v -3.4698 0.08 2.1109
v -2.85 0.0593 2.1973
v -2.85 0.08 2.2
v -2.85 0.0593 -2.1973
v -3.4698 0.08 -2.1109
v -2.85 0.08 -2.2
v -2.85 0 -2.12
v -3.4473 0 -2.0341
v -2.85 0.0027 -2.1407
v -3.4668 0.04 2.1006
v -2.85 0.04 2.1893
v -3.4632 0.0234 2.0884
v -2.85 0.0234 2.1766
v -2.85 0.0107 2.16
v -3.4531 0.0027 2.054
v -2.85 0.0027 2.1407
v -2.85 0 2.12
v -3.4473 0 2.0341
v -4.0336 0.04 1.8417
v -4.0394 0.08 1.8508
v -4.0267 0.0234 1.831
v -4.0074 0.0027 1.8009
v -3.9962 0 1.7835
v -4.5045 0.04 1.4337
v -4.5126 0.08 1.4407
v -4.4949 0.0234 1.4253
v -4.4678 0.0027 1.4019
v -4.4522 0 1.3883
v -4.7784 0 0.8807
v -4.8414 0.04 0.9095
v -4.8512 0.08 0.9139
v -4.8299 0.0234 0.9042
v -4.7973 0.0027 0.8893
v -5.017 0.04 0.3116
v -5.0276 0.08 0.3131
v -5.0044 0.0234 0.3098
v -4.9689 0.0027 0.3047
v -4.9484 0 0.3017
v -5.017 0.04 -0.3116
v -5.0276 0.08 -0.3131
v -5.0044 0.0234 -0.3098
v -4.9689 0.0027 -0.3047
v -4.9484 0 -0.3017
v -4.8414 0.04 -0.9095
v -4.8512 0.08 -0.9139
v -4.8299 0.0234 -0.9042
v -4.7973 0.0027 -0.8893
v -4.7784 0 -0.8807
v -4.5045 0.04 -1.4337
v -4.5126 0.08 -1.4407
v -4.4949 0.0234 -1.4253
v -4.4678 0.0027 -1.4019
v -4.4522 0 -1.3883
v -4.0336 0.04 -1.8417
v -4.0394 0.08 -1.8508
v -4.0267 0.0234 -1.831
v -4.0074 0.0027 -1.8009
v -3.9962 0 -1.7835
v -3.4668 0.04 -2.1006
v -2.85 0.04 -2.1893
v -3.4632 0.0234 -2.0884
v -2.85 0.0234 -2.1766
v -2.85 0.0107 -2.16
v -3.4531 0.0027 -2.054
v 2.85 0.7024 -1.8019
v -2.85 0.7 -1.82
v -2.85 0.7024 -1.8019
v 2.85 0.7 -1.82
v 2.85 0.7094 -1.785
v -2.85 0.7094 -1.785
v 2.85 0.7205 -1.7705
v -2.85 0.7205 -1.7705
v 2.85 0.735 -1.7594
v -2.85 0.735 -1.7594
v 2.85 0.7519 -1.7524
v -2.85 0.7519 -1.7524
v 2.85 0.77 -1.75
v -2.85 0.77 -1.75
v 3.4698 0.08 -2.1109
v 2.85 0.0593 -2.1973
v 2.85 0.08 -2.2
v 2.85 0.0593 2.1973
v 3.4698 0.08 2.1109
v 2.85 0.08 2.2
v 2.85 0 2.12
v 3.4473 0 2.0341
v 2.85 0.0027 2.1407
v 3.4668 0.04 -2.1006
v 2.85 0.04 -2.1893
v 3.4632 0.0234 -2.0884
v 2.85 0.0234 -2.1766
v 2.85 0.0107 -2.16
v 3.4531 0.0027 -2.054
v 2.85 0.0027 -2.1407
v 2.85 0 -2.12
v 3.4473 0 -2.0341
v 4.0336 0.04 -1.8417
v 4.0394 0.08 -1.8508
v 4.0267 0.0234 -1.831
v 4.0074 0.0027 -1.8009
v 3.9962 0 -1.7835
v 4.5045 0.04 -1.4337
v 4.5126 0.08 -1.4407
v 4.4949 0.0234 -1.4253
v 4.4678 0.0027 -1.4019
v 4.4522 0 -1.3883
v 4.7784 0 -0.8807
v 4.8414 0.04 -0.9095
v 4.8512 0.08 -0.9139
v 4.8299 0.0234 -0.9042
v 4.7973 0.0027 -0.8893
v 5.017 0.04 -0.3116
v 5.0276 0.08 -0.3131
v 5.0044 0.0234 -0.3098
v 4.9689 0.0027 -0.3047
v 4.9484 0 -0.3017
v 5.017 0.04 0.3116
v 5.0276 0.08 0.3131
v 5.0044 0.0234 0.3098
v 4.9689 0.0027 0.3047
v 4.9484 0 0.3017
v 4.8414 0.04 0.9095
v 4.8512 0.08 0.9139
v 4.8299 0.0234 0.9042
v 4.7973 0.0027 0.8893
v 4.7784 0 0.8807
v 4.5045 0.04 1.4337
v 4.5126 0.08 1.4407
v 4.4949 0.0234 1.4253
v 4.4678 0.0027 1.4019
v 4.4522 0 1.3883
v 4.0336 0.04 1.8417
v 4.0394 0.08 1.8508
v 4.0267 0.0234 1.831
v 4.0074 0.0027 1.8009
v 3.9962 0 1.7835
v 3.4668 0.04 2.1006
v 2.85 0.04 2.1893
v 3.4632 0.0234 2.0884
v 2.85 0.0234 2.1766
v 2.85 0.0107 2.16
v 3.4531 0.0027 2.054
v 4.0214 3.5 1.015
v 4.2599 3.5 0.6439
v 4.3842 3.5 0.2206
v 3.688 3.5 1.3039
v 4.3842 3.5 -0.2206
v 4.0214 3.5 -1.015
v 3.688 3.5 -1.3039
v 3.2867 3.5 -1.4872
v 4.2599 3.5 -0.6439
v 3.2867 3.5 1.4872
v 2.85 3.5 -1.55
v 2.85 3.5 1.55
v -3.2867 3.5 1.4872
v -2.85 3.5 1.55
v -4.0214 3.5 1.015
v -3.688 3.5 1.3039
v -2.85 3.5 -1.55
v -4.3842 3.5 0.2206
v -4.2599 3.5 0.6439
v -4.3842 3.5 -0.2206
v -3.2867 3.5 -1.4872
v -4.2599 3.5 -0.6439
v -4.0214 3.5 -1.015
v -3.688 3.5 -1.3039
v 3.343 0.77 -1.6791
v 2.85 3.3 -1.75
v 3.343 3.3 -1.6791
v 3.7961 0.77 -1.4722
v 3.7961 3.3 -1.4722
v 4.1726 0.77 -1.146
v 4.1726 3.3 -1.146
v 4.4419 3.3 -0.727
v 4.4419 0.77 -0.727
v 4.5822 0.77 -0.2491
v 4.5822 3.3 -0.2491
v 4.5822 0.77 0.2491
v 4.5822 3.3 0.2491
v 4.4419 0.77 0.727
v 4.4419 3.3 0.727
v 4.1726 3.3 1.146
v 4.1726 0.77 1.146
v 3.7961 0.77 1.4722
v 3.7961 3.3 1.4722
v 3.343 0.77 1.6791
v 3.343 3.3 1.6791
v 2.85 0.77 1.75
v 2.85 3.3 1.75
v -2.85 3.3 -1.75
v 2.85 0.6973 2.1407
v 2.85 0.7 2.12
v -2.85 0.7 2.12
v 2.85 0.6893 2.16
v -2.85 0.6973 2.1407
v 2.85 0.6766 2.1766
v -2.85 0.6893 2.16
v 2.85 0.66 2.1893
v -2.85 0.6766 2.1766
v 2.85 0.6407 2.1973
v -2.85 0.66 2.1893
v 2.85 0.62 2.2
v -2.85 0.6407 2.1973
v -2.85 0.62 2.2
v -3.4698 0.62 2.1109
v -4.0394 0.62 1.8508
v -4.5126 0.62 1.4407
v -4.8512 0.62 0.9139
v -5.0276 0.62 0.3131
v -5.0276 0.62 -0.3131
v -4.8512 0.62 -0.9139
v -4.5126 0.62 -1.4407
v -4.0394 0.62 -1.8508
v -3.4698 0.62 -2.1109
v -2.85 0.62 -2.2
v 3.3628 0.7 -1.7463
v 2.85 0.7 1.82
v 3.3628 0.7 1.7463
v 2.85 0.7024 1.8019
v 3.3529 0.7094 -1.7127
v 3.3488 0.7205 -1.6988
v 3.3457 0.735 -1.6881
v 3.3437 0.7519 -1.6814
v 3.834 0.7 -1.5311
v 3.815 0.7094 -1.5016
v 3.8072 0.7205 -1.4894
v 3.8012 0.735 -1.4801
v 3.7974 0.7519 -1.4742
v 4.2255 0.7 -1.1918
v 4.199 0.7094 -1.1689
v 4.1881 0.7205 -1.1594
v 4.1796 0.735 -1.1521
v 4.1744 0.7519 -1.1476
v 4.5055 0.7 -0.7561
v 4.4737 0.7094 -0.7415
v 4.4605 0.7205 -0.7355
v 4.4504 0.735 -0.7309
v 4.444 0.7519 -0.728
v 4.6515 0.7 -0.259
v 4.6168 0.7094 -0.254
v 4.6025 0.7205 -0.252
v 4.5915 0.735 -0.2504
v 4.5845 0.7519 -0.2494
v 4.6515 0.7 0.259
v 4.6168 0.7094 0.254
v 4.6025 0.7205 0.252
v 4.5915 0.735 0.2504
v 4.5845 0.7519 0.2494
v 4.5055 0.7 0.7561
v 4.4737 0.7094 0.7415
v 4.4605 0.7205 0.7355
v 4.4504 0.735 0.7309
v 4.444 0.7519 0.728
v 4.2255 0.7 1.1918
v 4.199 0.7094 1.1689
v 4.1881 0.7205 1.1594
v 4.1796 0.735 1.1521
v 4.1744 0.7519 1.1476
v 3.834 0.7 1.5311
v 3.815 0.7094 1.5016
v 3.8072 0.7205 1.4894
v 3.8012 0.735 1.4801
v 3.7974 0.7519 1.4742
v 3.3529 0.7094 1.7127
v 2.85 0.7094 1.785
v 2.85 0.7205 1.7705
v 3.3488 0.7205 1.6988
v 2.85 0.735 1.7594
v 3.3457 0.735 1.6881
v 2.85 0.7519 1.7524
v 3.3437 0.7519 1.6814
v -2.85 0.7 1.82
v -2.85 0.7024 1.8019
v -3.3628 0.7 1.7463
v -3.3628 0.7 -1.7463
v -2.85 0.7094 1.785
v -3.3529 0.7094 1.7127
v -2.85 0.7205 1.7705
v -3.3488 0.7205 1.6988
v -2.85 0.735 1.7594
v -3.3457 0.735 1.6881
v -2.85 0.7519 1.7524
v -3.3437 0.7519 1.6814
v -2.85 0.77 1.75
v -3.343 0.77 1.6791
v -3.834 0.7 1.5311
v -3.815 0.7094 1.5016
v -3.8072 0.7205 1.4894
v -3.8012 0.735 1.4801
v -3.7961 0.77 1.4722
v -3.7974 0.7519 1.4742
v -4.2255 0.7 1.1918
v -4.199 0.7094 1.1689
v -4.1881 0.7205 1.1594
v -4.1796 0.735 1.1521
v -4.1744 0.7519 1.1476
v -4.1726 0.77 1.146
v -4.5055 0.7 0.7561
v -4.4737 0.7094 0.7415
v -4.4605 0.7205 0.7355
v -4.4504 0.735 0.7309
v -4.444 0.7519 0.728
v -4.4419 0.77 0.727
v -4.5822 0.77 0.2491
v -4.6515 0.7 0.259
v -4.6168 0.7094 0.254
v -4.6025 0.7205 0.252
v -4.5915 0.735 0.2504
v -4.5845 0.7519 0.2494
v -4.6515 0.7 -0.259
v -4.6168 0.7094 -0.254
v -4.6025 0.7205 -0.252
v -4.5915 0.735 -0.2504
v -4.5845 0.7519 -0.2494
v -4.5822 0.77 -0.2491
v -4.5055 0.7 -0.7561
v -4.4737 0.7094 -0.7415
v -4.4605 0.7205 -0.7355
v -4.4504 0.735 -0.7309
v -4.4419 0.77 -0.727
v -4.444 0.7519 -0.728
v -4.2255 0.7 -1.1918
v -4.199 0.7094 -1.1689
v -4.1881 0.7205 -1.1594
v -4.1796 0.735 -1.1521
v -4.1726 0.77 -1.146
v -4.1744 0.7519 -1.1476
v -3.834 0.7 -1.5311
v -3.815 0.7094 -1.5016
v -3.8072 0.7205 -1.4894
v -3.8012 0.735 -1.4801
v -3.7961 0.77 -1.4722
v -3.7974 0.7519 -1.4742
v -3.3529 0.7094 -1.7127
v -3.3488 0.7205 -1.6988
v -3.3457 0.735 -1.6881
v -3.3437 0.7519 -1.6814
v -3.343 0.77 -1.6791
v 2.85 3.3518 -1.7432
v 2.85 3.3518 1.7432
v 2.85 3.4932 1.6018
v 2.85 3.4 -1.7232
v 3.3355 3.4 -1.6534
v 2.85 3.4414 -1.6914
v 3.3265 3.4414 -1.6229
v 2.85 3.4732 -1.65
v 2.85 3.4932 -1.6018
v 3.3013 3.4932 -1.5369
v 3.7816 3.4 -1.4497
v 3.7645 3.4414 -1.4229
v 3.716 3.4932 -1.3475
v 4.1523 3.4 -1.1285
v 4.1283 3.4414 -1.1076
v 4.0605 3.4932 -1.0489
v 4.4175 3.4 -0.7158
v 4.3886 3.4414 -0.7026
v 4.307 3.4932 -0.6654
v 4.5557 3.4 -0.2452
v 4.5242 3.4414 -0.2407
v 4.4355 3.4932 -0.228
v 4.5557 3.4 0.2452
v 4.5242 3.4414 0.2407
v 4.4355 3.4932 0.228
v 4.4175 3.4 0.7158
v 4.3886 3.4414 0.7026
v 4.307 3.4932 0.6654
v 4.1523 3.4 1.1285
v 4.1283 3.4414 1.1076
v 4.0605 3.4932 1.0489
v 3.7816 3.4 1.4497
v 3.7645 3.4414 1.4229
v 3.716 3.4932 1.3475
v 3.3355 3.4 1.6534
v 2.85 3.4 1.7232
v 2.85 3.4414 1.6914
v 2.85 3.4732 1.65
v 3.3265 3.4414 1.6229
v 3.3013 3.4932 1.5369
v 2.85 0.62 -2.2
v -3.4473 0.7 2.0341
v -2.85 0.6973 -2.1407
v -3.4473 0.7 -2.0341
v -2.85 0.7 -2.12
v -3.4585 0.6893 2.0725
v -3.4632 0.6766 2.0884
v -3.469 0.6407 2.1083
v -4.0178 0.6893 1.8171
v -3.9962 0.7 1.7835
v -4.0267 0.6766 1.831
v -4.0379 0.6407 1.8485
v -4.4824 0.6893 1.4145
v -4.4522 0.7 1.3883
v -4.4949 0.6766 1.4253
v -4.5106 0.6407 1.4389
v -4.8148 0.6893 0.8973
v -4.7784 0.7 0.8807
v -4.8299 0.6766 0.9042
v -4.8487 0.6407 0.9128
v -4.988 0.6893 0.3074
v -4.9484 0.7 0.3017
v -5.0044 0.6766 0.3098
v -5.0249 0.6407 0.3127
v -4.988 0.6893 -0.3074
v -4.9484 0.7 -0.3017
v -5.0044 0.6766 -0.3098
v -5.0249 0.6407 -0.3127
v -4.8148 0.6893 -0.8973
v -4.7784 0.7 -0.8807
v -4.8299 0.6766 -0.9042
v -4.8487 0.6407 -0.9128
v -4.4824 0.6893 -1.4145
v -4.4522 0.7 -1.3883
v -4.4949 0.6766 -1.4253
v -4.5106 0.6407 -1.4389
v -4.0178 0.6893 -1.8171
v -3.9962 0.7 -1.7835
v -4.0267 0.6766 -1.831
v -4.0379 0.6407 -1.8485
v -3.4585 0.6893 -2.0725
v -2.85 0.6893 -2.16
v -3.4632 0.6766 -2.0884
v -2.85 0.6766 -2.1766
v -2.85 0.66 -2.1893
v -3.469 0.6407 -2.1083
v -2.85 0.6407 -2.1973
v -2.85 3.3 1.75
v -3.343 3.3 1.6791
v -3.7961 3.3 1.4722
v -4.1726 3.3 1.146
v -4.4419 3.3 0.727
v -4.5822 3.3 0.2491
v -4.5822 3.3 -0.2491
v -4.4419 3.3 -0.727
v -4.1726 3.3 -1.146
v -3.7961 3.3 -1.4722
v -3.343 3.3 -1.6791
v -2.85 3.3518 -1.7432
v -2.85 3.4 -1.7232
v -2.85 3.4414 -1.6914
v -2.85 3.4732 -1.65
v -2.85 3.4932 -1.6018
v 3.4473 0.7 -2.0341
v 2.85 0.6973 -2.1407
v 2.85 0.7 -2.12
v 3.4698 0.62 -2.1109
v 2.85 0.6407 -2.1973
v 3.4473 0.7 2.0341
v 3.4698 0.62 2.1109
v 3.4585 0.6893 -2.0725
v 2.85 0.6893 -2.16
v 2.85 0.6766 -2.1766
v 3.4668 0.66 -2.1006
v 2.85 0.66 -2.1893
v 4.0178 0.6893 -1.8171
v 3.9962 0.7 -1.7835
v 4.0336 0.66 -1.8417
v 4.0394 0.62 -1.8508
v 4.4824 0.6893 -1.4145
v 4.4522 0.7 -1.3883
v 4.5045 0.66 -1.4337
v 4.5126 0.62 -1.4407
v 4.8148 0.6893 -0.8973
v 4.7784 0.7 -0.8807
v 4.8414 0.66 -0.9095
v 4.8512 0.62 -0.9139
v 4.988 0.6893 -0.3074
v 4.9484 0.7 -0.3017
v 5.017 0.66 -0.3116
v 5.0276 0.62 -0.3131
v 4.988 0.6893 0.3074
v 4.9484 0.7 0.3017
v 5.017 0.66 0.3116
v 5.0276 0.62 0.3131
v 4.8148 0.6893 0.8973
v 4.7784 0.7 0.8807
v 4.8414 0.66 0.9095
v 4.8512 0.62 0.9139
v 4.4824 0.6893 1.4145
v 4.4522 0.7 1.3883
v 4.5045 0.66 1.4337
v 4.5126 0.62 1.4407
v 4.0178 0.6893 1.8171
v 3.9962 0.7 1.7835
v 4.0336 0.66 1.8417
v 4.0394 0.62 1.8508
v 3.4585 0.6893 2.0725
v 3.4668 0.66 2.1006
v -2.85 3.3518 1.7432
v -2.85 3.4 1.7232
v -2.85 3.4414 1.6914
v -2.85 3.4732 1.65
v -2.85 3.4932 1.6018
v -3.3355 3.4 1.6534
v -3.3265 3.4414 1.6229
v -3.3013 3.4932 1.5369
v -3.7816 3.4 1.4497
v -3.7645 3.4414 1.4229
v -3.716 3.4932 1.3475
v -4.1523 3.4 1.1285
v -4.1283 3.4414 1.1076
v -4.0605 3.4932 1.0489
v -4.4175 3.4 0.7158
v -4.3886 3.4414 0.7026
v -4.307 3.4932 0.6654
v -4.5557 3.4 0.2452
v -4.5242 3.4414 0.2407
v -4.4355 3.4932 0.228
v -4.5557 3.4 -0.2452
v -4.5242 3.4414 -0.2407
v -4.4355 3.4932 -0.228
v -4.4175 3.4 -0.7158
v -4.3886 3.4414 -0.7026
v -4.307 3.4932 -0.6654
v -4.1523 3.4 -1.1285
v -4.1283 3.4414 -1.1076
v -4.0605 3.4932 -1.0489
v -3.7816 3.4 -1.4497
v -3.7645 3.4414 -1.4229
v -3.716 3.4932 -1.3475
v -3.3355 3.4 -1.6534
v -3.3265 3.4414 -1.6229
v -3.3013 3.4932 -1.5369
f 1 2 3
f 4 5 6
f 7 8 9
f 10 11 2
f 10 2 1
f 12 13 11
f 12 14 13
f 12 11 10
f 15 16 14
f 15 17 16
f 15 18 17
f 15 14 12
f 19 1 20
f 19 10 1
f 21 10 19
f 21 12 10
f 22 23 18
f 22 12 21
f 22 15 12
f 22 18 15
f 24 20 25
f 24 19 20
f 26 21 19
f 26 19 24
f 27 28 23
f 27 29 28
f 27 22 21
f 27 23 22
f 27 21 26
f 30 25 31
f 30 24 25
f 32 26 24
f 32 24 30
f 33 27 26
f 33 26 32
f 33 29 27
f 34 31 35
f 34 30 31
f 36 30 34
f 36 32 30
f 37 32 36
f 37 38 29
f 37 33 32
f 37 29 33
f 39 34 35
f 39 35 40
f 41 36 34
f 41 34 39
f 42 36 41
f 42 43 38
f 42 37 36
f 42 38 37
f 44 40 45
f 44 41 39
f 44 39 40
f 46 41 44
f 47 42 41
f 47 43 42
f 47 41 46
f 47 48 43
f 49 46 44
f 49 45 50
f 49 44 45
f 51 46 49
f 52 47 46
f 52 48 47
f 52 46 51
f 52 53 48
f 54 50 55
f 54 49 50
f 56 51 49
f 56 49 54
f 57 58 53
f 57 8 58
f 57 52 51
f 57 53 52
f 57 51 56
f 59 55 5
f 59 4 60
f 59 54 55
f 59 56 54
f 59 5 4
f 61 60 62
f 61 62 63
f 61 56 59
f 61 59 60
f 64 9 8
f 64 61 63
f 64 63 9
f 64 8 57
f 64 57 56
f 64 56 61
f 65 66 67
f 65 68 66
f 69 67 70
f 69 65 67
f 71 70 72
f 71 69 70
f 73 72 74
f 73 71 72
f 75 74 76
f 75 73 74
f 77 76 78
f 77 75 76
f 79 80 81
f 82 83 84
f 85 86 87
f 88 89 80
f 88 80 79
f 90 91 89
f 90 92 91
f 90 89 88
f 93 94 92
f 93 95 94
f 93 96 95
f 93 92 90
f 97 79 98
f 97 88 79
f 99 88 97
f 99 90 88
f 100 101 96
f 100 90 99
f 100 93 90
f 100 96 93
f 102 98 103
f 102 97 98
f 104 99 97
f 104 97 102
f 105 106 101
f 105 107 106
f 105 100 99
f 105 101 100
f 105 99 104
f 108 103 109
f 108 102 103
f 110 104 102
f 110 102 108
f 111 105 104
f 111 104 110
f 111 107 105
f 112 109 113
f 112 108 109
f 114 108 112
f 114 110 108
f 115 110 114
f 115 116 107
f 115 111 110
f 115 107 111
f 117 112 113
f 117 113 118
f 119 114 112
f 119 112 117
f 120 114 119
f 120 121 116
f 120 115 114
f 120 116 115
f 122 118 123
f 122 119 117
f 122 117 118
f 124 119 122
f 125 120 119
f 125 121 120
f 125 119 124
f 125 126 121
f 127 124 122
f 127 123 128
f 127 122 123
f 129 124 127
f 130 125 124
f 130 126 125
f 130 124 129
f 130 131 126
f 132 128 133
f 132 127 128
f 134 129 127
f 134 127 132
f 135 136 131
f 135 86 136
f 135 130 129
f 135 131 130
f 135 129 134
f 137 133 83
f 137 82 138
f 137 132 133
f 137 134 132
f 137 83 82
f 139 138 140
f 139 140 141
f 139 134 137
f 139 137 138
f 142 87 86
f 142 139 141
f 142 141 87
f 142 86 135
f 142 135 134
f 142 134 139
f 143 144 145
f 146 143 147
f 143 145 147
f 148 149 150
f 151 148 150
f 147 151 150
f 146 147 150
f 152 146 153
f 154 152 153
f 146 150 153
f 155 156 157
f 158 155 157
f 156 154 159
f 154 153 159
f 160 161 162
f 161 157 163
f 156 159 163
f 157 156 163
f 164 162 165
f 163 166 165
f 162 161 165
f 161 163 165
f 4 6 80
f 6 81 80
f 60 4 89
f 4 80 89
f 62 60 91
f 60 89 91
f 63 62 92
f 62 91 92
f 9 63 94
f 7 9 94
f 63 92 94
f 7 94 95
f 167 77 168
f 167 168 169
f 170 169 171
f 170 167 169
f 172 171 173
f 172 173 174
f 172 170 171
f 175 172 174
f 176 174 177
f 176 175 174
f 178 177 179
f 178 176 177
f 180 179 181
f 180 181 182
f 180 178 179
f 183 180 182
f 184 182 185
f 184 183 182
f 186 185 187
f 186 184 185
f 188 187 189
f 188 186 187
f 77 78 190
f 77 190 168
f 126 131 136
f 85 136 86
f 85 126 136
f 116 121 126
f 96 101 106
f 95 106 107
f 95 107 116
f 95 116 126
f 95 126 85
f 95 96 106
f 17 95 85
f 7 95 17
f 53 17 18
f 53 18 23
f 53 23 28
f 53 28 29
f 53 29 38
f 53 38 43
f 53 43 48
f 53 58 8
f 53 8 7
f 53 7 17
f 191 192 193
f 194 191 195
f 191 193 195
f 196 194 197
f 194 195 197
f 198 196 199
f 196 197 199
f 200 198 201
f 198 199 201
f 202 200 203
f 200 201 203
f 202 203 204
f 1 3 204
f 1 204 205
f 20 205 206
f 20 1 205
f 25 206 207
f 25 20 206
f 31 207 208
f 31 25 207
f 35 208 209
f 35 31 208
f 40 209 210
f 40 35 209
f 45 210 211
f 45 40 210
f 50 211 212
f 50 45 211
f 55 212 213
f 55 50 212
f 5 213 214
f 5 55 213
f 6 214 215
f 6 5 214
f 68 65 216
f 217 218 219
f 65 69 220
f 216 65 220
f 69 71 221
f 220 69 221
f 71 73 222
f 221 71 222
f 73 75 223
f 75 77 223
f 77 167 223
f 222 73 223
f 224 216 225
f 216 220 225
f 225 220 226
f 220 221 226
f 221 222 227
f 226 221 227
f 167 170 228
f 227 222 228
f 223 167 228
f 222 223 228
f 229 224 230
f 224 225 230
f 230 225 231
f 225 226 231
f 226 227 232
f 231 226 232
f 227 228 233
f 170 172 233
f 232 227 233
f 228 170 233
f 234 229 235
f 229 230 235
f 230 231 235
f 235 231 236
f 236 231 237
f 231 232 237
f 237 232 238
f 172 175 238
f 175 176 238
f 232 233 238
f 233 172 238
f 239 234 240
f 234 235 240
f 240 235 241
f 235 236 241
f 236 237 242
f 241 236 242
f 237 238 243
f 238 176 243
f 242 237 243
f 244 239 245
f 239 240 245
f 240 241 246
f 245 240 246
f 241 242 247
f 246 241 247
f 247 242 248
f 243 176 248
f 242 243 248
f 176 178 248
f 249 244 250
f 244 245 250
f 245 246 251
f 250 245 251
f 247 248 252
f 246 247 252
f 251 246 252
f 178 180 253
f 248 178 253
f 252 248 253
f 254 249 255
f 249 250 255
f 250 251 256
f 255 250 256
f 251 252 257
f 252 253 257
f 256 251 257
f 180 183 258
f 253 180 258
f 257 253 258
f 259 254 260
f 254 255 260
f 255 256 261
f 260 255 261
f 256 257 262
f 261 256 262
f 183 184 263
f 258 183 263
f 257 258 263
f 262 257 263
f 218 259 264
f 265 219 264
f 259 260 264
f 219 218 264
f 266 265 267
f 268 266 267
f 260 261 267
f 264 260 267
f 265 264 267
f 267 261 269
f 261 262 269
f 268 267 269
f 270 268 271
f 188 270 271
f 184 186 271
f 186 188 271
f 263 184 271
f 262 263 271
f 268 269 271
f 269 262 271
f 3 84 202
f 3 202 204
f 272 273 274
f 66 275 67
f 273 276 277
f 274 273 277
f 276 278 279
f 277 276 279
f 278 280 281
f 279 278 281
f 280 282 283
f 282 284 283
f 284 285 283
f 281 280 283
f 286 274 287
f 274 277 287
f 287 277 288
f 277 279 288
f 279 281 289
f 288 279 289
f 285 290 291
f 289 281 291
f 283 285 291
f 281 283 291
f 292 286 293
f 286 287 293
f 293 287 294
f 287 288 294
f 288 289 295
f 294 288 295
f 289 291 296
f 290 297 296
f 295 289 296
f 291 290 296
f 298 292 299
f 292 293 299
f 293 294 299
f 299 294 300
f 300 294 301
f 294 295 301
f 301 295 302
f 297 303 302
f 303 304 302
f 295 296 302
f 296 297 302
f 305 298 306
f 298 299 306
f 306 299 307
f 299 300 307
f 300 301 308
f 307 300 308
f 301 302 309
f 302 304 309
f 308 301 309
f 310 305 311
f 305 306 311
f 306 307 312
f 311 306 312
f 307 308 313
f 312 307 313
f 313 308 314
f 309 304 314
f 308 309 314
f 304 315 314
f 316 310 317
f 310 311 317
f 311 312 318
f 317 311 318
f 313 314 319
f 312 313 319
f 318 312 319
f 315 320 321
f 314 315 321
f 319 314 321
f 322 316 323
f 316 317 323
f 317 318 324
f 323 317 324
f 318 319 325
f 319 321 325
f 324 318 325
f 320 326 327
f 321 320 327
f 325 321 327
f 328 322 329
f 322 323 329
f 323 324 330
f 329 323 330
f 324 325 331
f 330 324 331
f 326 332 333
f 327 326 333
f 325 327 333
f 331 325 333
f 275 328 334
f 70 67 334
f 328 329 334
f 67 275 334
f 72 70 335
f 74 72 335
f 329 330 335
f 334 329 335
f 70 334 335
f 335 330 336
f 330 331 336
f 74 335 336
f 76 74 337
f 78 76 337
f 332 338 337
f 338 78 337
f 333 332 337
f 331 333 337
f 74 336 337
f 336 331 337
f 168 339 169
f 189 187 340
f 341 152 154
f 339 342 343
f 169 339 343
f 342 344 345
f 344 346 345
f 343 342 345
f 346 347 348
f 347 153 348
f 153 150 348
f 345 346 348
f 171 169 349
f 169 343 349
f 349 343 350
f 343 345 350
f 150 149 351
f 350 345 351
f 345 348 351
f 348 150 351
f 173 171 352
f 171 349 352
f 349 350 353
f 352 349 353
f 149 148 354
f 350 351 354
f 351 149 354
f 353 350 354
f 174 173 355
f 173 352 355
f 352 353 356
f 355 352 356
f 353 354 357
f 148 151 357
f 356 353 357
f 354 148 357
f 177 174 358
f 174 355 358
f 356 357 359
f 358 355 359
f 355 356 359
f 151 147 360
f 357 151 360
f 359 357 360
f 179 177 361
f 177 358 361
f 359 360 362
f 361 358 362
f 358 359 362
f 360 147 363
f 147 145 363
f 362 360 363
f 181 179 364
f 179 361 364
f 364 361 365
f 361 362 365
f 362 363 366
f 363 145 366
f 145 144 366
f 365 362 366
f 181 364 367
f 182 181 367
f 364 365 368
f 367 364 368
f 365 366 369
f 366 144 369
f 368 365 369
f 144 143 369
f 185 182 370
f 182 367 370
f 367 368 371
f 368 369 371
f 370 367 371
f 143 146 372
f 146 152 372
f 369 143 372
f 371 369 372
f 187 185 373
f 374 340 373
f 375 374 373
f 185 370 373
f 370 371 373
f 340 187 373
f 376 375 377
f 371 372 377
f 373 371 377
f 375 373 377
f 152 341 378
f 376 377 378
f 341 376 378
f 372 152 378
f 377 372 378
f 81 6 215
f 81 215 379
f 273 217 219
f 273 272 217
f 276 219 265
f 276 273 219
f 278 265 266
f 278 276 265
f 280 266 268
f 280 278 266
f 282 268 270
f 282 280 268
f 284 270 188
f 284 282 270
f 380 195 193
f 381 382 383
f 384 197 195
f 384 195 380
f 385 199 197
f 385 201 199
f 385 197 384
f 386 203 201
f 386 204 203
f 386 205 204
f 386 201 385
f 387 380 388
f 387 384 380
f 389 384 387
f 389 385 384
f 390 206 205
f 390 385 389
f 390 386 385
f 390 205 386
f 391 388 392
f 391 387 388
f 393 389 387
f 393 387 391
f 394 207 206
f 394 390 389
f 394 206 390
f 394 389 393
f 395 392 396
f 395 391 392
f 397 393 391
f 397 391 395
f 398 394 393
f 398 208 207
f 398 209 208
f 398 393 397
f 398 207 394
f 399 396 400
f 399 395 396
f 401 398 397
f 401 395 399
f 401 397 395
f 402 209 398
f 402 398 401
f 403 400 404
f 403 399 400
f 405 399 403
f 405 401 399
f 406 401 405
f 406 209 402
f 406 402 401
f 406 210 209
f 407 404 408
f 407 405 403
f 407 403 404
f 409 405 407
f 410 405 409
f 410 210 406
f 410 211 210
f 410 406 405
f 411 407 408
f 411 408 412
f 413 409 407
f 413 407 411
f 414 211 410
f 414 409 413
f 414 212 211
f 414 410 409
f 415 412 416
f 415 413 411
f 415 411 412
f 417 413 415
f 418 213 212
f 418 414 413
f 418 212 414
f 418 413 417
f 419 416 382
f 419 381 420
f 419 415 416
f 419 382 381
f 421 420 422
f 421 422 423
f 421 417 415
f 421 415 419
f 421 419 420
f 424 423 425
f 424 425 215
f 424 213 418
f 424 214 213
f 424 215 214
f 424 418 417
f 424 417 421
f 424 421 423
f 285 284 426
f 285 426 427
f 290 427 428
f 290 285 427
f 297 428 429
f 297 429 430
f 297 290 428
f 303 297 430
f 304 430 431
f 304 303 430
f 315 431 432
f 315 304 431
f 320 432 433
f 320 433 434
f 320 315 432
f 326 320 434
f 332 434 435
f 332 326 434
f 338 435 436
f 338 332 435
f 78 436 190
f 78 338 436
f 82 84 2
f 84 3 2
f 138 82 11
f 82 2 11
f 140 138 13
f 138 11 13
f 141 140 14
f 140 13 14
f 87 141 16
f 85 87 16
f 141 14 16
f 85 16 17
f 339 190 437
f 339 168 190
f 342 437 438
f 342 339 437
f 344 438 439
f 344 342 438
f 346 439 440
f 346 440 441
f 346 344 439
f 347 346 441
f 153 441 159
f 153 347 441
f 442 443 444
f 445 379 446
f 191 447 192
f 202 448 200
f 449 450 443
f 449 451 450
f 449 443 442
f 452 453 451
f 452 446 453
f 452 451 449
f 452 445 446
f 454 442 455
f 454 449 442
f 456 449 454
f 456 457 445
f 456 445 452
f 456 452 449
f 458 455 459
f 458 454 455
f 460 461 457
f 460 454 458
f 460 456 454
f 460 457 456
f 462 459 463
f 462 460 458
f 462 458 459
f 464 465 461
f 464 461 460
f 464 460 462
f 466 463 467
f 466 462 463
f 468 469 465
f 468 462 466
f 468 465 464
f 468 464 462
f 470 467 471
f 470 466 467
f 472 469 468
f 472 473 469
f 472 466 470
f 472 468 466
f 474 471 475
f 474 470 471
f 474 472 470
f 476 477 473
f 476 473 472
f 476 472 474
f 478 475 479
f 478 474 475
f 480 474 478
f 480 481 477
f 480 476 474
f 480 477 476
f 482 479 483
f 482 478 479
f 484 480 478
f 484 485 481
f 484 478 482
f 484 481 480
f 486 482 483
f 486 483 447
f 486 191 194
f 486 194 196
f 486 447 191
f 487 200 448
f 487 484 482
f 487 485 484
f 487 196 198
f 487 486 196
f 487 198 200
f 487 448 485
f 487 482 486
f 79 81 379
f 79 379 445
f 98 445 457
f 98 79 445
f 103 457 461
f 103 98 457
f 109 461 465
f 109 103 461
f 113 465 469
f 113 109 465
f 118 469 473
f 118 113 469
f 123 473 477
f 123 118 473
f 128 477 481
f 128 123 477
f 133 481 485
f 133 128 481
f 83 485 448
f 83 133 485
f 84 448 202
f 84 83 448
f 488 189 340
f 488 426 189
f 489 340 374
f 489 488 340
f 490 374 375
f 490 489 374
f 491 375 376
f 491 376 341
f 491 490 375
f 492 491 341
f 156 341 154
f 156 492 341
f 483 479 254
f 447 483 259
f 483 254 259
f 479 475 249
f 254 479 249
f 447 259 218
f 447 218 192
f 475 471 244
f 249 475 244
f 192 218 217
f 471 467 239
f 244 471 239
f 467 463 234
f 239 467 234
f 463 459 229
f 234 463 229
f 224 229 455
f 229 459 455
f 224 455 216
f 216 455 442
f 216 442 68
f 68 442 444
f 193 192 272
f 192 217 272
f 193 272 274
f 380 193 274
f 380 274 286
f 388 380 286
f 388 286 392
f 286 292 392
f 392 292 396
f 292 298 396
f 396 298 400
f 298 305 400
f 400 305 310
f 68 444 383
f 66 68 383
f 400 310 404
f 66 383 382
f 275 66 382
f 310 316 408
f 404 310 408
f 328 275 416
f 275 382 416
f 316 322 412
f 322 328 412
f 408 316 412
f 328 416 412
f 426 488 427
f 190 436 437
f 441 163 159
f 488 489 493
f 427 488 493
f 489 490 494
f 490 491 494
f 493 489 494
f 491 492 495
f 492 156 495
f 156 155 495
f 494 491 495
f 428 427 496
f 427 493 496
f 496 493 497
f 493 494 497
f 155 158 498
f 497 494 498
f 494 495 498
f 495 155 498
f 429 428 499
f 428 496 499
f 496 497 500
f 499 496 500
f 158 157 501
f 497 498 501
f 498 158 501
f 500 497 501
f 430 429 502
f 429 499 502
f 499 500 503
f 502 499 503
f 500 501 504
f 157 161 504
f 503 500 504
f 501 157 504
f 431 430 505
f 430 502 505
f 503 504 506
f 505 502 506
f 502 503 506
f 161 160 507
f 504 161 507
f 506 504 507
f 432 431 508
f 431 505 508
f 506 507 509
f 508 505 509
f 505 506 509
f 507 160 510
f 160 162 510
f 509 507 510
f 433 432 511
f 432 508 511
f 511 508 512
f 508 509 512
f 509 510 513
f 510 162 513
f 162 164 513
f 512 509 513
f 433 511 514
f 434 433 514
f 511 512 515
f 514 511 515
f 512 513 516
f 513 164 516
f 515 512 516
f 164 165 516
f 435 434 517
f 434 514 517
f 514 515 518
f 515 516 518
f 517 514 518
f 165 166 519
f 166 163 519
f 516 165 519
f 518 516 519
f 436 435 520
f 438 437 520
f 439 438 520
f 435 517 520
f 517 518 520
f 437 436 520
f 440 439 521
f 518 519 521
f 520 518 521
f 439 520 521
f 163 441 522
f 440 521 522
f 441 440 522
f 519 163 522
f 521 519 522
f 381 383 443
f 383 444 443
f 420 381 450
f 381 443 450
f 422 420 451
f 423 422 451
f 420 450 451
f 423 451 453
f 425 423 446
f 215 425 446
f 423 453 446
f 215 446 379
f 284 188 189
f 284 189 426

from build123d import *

# Parameters (mm, degrees)
BOSS_EXTRUDE1_DEPTH = 0.7
BOSS_EXTRUDE2_DEPTH = 2.8
FILLET1_R           = 0.2
FILLET2_R           = 0.08
FILLET3_R           = 0.07


with BuildPart() as part:
    # Sketch1 → Boss-Extrude1 (new body)
    with BuildSketch(Plane(origin=(0, 0, 0), x_dir=(1, 0, 0), z_dir=(0, 1, 0))):
        with BuildLine():
            Line((-2.85, 2.2), (2.85, 2.2))
            ThreePointArc((2.85, 2.2), (5.05, 0), (2.85, -2.2))
            Line((2.85, -2.2), (-2.85, -2.2))
            ThreePointArc((-2.85, -2.2), (-5.05, 0), (-2.85, 2.2))
        make_face()
    extrude(amount=BOSS_EXTRUDE1_DEPTH)

    # Sketch2 → Boss-Extrude2 (add)
    with BuildSketch(Plane(origin=(0, 0.7, 0), x_dir=(1, 0, 0), z_dir=(0, 1, 0))):
        with BuildLine():
            Line((-2.85, 1.75), (2.85, 1.75))
            ThreePointArc((2.85, 1.75), (4.6, 0), (2.85, -1.75))
            Line((2.85, -1.75), (-2.85, -1.75))
            ThreePointArc((-2.85, -1.75), (-4.6, 0), (-2.85, 1.75))
        make_face()
    extrude(amount=BOSS_EXTRUDE2_DEPTH)

    # Fillet1
    fillet1_edges = [part.edges().sort_by_distance(p)[0] for p in [
        (-4.6, 3.5, 0),
        (0, 3.5, 1.75),
        (4.6, 3.5, 0),
        (0, 3.5, -1.75),
    ]]
    fillet(fillet1_edges, radius=FILLET1_R)

    # Fillet2
    fillet2_edges = [part.edges().sort_by_distance(p)[0] for p in [
        (5.05, 0.7, 0),
        (0, 0.7, -2.2),
        (-5.05, 0.7, 0),
        (0, 0, -2.2),
        (5.05, 0, 0),
        (0, 0, 2.2),
        (-5.05, 0, 0),
        (0, 0.7, 2.2),
    ]]
    fillet(fillet2_edges, radius=FILLET2_R)

    # Fillet3
    fillet3_edges = [part.edges().sort_by_distance(p)[0] for p in [
        (-4.6, 0.7, 0),
        (0, 0.7, 1.75),
        (4.6, 0.7, 0),
        (0, 0.7, -1.75),
    ]]
    fillet(fillet3_edges, radius=FILLET3_R)


solid = part.part
